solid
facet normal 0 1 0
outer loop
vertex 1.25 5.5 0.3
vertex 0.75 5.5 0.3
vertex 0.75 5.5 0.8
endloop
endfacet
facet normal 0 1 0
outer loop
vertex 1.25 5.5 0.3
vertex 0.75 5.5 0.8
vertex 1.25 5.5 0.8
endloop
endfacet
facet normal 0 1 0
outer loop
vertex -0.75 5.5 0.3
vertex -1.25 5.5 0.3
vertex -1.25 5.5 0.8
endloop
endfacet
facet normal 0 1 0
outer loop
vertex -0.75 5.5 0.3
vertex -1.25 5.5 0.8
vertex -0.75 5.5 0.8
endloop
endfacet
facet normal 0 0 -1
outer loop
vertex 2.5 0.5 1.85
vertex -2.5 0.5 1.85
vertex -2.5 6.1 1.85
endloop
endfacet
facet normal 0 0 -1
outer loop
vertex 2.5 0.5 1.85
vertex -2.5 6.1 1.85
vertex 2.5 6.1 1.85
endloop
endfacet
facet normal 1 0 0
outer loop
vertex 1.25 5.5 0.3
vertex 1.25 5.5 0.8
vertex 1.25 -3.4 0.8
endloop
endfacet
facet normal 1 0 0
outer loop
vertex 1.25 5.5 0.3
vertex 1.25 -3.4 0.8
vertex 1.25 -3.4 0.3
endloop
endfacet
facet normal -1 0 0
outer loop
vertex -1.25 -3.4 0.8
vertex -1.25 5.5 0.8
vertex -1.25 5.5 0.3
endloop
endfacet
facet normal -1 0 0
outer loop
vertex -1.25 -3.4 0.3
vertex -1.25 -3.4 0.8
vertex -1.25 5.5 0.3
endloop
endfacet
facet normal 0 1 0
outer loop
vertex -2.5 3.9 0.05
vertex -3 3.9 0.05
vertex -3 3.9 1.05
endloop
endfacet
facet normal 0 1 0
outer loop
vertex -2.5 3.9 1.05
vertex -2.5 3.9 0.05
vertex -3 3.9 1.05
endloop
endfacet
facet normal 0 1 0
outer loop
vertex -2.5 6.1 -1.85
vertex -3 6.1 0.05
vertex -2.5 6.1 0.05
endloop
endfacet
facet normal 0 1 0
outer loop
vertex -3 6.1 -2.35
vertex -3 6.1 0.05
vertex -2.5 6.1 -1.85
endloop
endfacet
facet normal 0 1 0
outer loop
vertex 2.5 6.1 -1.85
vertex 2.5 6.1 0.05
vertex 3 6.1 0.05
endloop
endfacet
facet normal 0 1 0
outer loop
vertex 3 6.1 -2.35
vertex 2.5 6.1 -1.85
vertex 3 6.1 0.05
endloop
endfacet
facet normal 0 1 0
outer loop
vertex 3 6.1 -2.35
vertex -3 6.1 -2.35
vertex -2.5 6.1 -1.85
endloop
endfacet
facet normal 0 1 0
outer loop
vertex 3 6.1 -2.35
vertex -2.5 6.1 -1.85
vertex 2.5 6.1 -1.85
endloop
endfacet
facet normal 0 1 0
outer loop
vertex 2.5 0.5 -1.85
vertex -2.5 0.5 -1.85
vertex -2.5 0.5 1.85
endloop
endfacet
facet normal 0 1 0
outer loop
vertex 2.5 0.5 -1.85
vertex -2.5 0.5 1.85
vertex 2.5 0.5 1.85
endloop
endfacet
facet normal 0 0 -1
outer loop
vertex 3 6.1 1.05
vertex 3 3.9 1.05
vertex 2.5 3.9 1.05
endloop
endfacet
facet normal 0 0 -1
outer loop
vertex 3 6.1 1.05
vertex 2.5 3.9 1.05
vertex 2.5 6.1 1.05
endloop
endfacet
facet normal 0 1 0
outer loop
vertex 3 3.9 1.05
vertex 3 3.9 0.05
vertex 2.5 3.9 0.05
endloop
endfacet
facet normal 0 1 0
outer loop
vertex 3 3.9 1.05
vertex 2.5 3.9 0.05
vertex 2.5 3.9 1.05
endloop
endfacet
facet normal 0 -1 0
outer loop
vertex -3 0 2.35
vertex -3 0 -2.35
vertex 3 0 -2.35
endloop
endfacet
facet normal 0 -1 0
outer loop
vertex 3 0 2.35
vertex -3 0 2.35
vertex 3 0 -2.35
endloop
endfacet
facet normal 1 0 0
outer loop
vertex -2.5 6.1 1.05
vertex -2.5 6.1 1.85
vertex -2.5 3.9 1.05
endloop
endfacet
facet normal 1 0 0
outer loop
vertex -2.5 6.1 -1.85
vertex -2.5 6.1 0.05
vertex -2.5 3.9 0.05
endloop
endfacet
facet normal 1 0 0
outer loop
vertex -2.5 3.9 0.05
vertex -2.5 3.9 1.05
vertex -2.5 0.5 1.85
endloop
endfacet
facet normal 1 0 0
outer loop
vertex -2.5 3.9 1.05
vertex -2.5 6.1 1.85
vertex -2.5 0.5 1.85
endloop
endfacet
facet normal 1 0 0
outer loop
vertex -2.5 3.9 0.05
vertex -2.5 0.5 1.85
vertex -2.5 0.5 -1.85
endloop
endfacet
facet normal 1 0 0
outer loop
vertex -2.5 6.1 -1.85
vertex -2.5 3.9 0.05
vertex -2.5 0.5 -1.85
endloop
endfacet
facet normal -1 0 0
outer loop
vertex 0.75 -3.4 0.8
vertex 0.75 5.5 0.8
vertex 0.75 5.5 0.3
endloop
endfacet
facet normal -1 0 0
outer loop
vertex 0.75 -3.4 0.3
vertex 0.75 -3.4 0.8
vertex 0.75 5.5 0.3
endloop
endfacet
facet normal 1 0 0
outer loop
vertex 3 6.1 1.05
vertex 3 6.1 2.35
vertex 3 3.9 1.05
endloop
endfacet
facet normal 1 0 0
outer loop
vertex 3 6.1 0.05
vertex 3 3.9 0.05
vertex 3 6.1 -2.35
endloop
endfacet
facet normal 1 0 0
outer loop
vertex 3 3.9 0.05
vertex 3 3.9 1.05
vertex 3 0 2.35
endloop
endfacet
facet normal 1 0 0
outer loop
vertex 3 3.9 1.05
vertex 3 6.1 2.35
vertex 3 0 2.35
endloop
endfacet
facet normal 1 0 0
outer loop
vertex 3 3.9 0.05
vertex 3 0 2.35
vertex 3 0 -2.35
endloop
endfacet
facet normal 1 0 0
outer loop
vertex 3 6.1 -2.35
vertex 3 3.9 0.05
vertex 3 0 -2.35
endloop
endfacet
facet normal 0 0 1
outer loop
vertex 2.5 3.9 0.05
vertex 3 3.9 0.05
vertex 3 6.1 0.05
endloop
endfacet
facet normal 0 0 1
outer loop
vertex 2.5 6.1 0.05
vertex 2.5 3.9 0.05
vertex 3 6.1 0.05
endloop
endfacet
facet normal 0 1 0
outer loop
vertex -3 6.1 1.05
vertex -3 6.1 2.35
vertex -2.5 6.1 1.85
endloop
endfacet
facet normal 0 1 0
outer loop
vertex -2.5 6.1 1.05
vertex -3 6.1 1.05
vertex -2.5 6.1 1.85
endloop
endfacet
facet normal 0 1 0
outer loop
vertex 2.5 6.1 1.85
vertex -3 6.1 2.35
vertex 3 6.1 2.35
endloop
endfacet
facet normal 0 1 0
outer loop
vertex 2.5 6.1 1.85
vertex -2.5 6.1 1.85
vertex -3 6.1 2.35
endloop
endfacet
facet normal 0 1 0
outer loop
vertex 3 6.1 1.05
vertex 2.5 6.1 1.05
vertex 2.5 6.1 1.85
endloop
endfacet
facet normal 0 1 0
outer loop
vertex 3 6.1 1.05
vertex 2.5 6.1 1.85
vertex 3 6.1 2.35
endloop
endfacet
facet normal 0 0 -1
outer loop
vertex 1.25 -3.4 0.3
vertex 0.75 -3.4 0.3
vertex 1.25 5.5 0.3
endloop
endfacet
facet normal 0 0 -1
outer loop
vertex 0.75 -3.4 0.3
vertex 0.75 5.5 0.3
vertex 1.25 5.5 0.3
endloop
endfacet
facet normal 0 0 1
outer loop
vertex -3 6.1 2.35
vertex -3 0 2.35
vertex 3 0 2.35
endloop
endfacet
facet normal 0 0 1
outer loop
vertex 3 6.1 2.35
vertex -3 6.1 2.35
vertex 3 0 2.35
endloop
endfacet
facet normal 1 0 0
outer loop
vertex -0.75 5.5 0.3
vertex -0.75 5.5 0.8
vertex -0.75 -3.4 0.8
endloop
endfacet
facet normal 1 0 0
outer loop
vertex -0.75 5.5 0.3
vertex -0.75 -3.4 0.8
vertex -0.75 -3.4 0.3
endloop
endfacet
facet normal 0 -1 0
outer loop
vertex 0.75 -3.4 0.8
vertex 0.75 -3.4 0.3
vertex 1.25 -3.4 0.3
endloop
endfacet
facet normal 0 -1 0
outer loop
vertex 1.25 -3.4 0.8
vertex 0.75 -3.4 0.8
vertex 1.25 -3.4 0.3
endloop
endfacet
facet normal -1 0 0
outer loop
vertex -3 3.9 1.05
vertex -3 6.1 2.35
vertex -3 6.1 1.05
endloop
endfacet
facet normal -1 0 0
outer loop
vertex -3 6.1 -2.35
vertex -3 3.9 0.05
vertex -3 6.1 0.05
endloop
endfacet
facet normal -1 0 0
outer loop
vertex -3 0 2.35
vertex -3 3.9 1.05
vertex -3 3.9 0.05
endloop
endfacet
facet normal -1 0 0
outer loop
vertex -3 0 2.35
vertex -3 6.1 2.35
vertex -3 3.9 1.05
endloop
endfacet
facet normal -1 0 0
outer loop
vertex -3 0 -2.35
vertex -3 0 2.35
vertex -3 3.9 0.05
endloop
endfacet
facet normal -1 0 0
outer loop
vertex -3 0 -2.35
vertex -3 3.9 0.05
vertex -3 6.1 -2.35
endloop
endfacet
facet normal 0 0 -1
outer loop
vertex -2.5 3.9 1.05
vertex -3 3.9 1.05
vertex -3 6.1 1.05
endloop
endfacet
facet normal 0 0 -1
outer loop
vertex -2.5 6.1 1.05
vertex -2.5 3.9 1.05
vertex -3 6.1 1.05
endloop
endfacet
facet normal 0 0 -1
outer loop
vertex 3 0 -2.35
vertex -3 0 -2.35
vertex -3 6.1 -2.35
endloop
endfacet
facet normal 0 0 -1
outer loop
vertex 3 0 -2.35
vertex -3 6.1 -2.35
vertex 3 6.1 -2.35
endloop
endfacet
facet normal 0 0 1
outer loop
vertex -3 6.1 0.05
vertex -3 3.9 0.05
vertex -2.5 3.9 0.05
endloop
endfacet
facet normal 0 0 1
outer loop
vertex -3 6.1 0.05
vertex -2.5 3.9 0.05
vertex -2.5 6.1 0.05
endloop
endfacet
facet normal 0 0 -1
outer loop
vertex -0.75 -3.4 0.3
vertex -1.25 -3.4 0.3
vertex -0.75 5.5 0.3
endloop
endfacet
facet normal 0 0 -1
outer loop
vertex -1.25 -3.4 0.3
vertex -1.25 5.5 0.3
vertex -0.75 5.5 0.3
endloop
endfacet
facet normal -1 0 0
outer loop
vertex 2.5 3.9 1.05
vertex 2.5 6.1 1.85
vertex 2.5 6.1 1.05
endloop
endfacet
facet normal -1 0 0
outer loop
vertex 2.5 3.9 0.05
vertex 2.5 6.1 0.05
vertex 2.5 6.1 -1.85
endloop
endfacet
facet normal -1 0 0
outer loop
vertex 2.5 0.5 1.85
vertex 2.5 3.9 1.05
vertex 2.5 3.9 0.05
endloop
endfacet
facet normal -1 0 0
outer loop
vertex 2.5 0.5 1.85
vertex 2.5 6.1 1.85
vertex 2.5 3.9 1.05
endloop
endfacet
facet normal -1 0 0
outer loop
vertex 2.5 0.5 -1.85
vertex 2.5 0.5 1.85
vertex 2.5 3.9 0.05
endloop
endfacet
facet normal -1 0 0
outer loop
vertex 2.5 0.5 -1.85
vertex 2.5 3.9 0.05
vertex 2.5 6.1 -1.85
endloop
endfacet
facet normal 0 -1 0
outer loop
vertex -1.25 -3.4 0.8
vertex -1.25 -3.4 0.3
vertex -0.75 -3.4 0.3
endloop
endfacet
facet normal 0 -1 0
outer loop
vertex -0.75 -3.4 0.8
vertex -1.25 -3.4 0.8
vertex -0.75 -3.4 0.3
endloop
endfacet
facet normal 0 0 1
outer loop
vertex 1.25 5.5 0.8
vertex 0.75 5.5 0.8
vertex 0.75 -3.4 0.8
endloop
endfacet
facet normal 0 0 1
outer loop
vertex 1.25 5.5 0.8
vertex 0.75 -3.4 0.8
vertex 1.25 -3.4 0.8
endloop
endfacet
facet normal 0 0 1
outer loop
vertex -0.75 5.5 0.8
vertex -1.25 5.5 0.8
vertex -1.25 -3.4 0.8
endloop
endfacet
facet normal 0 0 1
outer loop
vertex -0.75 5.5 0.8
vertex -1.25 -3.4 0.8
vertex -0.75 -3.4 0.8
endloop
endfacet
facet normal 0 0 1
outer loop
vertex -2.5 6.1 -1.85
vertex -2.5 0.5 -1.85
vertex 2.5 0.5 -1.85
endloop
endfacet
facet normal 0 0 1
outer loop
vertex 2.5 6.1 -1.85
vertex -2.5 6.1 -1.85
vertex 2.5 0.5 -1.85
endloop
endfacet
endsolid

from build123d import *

# Parameters (mm, degrees)
SKETCH1_W                  = 6
SKETCH1_H                  = 4.7
BOSS_EXTRUDE1_DEPTH        = 6.1
SHELL1_T                   = -0.5
SKETCH2_W                  = 0.5
SKETCH2_H                  = 0.5
BOSS_EXTRUDE2_DEPTH        = 5
BOSS_EXTRUDE2_DEPTH_BACK   = 3.9
BOSS_EXTRUDE2_2_DEPTH      = 5
BOSS_EXTRUDE2_2_DEPTH_BACK = 3.9
SKETCH3_W                  = 1
SKETCH3_H                  = 2.2
CUT_EXTRUDE1_DEPTH         = 5.5


with BuildPart() as part:
    # Sketch1 → Boss-Extrude1 (new body)
    with BuildSketch(Plane(origin=(0, 0, 0), x_dir=(1, 0, 0), z_dir=(0, 1, 0))):
        Rectangle(SKETCH1_W, SKETCH1_H)
    extrude(amount=BOSS_EXTRUDE1_DEPTH)

    # Shell1
    shell1_openings = [part.faces().sort_by_distance(p)[0] for p in [
        (0, 6.1, 0),
    ]]
    offset(amount=SHELL1_T, openings=shell1_openings, kind=Kind.INTERSECTION)

    # Sketch3 → Cut-Extrude1 (cut)
    with BuildSketch(Plane.ZY.offset(3)):
        with Locations((0.55, 5)):
            Rectangle(SKETCH3_W, SKETCH3_H)
    cut_extrude1 = extrude(amount=-CUT_EXTRUDE1_DEPTH, mode=Mode.SUBTRACT)

    # Mirror1: Cut-Extrude1 across plane
    add(cut_extrude1.mirror(Plane(origin=(0, 0, 0), x_dir=(0, 0, 1), z_dir=(1, 0, 0))), mode=Mode.SUBTRACT)


with BuildPart() as body_2:
    # Sketch2 → Boss-Extrude2 (new body, two sides)
    with BuildSketch(Plane(origin=(0, 0.5, 0), x_dir=(1, 0, 0), z_dir=(0, 1, 0))) as boss_extrude2_sk:
        with Locations((-1, -0.55)):
            Rectangle(SKETCH2_W, SKETCH2_H)
    extrude(amount=BOSS_EXTRUDE2_DEPTH)
    extrude(boss_extrude2_sk.sketch, amount=-BOSS_EXTRUDE2_DEPTH_BACK)


with BuildPart() as body_3:
    # Sketch2 → Boss-Extrude2 2 (new body, two sides)
    with BuildSketch(Plane(origin=(0, 0.5, 0), x_dir=(1, 0, 0), z_dir=(0, 1, 0))) as boss_extrude2_2_sk:
        with Locations((1, -0.55)):
            Rectangle(SKETCH2_W, SKETCH2_H)
    extrude(amount=BOSS_EXTRUDE2_2_DEPTH)
    extrude(boss_extrude2_2_sk.sketch, amount=-BOSS_EXTRUDE2_2_DEPTH_BACK)


solid = Compound([part.part, body_2.part, body_3.part])
